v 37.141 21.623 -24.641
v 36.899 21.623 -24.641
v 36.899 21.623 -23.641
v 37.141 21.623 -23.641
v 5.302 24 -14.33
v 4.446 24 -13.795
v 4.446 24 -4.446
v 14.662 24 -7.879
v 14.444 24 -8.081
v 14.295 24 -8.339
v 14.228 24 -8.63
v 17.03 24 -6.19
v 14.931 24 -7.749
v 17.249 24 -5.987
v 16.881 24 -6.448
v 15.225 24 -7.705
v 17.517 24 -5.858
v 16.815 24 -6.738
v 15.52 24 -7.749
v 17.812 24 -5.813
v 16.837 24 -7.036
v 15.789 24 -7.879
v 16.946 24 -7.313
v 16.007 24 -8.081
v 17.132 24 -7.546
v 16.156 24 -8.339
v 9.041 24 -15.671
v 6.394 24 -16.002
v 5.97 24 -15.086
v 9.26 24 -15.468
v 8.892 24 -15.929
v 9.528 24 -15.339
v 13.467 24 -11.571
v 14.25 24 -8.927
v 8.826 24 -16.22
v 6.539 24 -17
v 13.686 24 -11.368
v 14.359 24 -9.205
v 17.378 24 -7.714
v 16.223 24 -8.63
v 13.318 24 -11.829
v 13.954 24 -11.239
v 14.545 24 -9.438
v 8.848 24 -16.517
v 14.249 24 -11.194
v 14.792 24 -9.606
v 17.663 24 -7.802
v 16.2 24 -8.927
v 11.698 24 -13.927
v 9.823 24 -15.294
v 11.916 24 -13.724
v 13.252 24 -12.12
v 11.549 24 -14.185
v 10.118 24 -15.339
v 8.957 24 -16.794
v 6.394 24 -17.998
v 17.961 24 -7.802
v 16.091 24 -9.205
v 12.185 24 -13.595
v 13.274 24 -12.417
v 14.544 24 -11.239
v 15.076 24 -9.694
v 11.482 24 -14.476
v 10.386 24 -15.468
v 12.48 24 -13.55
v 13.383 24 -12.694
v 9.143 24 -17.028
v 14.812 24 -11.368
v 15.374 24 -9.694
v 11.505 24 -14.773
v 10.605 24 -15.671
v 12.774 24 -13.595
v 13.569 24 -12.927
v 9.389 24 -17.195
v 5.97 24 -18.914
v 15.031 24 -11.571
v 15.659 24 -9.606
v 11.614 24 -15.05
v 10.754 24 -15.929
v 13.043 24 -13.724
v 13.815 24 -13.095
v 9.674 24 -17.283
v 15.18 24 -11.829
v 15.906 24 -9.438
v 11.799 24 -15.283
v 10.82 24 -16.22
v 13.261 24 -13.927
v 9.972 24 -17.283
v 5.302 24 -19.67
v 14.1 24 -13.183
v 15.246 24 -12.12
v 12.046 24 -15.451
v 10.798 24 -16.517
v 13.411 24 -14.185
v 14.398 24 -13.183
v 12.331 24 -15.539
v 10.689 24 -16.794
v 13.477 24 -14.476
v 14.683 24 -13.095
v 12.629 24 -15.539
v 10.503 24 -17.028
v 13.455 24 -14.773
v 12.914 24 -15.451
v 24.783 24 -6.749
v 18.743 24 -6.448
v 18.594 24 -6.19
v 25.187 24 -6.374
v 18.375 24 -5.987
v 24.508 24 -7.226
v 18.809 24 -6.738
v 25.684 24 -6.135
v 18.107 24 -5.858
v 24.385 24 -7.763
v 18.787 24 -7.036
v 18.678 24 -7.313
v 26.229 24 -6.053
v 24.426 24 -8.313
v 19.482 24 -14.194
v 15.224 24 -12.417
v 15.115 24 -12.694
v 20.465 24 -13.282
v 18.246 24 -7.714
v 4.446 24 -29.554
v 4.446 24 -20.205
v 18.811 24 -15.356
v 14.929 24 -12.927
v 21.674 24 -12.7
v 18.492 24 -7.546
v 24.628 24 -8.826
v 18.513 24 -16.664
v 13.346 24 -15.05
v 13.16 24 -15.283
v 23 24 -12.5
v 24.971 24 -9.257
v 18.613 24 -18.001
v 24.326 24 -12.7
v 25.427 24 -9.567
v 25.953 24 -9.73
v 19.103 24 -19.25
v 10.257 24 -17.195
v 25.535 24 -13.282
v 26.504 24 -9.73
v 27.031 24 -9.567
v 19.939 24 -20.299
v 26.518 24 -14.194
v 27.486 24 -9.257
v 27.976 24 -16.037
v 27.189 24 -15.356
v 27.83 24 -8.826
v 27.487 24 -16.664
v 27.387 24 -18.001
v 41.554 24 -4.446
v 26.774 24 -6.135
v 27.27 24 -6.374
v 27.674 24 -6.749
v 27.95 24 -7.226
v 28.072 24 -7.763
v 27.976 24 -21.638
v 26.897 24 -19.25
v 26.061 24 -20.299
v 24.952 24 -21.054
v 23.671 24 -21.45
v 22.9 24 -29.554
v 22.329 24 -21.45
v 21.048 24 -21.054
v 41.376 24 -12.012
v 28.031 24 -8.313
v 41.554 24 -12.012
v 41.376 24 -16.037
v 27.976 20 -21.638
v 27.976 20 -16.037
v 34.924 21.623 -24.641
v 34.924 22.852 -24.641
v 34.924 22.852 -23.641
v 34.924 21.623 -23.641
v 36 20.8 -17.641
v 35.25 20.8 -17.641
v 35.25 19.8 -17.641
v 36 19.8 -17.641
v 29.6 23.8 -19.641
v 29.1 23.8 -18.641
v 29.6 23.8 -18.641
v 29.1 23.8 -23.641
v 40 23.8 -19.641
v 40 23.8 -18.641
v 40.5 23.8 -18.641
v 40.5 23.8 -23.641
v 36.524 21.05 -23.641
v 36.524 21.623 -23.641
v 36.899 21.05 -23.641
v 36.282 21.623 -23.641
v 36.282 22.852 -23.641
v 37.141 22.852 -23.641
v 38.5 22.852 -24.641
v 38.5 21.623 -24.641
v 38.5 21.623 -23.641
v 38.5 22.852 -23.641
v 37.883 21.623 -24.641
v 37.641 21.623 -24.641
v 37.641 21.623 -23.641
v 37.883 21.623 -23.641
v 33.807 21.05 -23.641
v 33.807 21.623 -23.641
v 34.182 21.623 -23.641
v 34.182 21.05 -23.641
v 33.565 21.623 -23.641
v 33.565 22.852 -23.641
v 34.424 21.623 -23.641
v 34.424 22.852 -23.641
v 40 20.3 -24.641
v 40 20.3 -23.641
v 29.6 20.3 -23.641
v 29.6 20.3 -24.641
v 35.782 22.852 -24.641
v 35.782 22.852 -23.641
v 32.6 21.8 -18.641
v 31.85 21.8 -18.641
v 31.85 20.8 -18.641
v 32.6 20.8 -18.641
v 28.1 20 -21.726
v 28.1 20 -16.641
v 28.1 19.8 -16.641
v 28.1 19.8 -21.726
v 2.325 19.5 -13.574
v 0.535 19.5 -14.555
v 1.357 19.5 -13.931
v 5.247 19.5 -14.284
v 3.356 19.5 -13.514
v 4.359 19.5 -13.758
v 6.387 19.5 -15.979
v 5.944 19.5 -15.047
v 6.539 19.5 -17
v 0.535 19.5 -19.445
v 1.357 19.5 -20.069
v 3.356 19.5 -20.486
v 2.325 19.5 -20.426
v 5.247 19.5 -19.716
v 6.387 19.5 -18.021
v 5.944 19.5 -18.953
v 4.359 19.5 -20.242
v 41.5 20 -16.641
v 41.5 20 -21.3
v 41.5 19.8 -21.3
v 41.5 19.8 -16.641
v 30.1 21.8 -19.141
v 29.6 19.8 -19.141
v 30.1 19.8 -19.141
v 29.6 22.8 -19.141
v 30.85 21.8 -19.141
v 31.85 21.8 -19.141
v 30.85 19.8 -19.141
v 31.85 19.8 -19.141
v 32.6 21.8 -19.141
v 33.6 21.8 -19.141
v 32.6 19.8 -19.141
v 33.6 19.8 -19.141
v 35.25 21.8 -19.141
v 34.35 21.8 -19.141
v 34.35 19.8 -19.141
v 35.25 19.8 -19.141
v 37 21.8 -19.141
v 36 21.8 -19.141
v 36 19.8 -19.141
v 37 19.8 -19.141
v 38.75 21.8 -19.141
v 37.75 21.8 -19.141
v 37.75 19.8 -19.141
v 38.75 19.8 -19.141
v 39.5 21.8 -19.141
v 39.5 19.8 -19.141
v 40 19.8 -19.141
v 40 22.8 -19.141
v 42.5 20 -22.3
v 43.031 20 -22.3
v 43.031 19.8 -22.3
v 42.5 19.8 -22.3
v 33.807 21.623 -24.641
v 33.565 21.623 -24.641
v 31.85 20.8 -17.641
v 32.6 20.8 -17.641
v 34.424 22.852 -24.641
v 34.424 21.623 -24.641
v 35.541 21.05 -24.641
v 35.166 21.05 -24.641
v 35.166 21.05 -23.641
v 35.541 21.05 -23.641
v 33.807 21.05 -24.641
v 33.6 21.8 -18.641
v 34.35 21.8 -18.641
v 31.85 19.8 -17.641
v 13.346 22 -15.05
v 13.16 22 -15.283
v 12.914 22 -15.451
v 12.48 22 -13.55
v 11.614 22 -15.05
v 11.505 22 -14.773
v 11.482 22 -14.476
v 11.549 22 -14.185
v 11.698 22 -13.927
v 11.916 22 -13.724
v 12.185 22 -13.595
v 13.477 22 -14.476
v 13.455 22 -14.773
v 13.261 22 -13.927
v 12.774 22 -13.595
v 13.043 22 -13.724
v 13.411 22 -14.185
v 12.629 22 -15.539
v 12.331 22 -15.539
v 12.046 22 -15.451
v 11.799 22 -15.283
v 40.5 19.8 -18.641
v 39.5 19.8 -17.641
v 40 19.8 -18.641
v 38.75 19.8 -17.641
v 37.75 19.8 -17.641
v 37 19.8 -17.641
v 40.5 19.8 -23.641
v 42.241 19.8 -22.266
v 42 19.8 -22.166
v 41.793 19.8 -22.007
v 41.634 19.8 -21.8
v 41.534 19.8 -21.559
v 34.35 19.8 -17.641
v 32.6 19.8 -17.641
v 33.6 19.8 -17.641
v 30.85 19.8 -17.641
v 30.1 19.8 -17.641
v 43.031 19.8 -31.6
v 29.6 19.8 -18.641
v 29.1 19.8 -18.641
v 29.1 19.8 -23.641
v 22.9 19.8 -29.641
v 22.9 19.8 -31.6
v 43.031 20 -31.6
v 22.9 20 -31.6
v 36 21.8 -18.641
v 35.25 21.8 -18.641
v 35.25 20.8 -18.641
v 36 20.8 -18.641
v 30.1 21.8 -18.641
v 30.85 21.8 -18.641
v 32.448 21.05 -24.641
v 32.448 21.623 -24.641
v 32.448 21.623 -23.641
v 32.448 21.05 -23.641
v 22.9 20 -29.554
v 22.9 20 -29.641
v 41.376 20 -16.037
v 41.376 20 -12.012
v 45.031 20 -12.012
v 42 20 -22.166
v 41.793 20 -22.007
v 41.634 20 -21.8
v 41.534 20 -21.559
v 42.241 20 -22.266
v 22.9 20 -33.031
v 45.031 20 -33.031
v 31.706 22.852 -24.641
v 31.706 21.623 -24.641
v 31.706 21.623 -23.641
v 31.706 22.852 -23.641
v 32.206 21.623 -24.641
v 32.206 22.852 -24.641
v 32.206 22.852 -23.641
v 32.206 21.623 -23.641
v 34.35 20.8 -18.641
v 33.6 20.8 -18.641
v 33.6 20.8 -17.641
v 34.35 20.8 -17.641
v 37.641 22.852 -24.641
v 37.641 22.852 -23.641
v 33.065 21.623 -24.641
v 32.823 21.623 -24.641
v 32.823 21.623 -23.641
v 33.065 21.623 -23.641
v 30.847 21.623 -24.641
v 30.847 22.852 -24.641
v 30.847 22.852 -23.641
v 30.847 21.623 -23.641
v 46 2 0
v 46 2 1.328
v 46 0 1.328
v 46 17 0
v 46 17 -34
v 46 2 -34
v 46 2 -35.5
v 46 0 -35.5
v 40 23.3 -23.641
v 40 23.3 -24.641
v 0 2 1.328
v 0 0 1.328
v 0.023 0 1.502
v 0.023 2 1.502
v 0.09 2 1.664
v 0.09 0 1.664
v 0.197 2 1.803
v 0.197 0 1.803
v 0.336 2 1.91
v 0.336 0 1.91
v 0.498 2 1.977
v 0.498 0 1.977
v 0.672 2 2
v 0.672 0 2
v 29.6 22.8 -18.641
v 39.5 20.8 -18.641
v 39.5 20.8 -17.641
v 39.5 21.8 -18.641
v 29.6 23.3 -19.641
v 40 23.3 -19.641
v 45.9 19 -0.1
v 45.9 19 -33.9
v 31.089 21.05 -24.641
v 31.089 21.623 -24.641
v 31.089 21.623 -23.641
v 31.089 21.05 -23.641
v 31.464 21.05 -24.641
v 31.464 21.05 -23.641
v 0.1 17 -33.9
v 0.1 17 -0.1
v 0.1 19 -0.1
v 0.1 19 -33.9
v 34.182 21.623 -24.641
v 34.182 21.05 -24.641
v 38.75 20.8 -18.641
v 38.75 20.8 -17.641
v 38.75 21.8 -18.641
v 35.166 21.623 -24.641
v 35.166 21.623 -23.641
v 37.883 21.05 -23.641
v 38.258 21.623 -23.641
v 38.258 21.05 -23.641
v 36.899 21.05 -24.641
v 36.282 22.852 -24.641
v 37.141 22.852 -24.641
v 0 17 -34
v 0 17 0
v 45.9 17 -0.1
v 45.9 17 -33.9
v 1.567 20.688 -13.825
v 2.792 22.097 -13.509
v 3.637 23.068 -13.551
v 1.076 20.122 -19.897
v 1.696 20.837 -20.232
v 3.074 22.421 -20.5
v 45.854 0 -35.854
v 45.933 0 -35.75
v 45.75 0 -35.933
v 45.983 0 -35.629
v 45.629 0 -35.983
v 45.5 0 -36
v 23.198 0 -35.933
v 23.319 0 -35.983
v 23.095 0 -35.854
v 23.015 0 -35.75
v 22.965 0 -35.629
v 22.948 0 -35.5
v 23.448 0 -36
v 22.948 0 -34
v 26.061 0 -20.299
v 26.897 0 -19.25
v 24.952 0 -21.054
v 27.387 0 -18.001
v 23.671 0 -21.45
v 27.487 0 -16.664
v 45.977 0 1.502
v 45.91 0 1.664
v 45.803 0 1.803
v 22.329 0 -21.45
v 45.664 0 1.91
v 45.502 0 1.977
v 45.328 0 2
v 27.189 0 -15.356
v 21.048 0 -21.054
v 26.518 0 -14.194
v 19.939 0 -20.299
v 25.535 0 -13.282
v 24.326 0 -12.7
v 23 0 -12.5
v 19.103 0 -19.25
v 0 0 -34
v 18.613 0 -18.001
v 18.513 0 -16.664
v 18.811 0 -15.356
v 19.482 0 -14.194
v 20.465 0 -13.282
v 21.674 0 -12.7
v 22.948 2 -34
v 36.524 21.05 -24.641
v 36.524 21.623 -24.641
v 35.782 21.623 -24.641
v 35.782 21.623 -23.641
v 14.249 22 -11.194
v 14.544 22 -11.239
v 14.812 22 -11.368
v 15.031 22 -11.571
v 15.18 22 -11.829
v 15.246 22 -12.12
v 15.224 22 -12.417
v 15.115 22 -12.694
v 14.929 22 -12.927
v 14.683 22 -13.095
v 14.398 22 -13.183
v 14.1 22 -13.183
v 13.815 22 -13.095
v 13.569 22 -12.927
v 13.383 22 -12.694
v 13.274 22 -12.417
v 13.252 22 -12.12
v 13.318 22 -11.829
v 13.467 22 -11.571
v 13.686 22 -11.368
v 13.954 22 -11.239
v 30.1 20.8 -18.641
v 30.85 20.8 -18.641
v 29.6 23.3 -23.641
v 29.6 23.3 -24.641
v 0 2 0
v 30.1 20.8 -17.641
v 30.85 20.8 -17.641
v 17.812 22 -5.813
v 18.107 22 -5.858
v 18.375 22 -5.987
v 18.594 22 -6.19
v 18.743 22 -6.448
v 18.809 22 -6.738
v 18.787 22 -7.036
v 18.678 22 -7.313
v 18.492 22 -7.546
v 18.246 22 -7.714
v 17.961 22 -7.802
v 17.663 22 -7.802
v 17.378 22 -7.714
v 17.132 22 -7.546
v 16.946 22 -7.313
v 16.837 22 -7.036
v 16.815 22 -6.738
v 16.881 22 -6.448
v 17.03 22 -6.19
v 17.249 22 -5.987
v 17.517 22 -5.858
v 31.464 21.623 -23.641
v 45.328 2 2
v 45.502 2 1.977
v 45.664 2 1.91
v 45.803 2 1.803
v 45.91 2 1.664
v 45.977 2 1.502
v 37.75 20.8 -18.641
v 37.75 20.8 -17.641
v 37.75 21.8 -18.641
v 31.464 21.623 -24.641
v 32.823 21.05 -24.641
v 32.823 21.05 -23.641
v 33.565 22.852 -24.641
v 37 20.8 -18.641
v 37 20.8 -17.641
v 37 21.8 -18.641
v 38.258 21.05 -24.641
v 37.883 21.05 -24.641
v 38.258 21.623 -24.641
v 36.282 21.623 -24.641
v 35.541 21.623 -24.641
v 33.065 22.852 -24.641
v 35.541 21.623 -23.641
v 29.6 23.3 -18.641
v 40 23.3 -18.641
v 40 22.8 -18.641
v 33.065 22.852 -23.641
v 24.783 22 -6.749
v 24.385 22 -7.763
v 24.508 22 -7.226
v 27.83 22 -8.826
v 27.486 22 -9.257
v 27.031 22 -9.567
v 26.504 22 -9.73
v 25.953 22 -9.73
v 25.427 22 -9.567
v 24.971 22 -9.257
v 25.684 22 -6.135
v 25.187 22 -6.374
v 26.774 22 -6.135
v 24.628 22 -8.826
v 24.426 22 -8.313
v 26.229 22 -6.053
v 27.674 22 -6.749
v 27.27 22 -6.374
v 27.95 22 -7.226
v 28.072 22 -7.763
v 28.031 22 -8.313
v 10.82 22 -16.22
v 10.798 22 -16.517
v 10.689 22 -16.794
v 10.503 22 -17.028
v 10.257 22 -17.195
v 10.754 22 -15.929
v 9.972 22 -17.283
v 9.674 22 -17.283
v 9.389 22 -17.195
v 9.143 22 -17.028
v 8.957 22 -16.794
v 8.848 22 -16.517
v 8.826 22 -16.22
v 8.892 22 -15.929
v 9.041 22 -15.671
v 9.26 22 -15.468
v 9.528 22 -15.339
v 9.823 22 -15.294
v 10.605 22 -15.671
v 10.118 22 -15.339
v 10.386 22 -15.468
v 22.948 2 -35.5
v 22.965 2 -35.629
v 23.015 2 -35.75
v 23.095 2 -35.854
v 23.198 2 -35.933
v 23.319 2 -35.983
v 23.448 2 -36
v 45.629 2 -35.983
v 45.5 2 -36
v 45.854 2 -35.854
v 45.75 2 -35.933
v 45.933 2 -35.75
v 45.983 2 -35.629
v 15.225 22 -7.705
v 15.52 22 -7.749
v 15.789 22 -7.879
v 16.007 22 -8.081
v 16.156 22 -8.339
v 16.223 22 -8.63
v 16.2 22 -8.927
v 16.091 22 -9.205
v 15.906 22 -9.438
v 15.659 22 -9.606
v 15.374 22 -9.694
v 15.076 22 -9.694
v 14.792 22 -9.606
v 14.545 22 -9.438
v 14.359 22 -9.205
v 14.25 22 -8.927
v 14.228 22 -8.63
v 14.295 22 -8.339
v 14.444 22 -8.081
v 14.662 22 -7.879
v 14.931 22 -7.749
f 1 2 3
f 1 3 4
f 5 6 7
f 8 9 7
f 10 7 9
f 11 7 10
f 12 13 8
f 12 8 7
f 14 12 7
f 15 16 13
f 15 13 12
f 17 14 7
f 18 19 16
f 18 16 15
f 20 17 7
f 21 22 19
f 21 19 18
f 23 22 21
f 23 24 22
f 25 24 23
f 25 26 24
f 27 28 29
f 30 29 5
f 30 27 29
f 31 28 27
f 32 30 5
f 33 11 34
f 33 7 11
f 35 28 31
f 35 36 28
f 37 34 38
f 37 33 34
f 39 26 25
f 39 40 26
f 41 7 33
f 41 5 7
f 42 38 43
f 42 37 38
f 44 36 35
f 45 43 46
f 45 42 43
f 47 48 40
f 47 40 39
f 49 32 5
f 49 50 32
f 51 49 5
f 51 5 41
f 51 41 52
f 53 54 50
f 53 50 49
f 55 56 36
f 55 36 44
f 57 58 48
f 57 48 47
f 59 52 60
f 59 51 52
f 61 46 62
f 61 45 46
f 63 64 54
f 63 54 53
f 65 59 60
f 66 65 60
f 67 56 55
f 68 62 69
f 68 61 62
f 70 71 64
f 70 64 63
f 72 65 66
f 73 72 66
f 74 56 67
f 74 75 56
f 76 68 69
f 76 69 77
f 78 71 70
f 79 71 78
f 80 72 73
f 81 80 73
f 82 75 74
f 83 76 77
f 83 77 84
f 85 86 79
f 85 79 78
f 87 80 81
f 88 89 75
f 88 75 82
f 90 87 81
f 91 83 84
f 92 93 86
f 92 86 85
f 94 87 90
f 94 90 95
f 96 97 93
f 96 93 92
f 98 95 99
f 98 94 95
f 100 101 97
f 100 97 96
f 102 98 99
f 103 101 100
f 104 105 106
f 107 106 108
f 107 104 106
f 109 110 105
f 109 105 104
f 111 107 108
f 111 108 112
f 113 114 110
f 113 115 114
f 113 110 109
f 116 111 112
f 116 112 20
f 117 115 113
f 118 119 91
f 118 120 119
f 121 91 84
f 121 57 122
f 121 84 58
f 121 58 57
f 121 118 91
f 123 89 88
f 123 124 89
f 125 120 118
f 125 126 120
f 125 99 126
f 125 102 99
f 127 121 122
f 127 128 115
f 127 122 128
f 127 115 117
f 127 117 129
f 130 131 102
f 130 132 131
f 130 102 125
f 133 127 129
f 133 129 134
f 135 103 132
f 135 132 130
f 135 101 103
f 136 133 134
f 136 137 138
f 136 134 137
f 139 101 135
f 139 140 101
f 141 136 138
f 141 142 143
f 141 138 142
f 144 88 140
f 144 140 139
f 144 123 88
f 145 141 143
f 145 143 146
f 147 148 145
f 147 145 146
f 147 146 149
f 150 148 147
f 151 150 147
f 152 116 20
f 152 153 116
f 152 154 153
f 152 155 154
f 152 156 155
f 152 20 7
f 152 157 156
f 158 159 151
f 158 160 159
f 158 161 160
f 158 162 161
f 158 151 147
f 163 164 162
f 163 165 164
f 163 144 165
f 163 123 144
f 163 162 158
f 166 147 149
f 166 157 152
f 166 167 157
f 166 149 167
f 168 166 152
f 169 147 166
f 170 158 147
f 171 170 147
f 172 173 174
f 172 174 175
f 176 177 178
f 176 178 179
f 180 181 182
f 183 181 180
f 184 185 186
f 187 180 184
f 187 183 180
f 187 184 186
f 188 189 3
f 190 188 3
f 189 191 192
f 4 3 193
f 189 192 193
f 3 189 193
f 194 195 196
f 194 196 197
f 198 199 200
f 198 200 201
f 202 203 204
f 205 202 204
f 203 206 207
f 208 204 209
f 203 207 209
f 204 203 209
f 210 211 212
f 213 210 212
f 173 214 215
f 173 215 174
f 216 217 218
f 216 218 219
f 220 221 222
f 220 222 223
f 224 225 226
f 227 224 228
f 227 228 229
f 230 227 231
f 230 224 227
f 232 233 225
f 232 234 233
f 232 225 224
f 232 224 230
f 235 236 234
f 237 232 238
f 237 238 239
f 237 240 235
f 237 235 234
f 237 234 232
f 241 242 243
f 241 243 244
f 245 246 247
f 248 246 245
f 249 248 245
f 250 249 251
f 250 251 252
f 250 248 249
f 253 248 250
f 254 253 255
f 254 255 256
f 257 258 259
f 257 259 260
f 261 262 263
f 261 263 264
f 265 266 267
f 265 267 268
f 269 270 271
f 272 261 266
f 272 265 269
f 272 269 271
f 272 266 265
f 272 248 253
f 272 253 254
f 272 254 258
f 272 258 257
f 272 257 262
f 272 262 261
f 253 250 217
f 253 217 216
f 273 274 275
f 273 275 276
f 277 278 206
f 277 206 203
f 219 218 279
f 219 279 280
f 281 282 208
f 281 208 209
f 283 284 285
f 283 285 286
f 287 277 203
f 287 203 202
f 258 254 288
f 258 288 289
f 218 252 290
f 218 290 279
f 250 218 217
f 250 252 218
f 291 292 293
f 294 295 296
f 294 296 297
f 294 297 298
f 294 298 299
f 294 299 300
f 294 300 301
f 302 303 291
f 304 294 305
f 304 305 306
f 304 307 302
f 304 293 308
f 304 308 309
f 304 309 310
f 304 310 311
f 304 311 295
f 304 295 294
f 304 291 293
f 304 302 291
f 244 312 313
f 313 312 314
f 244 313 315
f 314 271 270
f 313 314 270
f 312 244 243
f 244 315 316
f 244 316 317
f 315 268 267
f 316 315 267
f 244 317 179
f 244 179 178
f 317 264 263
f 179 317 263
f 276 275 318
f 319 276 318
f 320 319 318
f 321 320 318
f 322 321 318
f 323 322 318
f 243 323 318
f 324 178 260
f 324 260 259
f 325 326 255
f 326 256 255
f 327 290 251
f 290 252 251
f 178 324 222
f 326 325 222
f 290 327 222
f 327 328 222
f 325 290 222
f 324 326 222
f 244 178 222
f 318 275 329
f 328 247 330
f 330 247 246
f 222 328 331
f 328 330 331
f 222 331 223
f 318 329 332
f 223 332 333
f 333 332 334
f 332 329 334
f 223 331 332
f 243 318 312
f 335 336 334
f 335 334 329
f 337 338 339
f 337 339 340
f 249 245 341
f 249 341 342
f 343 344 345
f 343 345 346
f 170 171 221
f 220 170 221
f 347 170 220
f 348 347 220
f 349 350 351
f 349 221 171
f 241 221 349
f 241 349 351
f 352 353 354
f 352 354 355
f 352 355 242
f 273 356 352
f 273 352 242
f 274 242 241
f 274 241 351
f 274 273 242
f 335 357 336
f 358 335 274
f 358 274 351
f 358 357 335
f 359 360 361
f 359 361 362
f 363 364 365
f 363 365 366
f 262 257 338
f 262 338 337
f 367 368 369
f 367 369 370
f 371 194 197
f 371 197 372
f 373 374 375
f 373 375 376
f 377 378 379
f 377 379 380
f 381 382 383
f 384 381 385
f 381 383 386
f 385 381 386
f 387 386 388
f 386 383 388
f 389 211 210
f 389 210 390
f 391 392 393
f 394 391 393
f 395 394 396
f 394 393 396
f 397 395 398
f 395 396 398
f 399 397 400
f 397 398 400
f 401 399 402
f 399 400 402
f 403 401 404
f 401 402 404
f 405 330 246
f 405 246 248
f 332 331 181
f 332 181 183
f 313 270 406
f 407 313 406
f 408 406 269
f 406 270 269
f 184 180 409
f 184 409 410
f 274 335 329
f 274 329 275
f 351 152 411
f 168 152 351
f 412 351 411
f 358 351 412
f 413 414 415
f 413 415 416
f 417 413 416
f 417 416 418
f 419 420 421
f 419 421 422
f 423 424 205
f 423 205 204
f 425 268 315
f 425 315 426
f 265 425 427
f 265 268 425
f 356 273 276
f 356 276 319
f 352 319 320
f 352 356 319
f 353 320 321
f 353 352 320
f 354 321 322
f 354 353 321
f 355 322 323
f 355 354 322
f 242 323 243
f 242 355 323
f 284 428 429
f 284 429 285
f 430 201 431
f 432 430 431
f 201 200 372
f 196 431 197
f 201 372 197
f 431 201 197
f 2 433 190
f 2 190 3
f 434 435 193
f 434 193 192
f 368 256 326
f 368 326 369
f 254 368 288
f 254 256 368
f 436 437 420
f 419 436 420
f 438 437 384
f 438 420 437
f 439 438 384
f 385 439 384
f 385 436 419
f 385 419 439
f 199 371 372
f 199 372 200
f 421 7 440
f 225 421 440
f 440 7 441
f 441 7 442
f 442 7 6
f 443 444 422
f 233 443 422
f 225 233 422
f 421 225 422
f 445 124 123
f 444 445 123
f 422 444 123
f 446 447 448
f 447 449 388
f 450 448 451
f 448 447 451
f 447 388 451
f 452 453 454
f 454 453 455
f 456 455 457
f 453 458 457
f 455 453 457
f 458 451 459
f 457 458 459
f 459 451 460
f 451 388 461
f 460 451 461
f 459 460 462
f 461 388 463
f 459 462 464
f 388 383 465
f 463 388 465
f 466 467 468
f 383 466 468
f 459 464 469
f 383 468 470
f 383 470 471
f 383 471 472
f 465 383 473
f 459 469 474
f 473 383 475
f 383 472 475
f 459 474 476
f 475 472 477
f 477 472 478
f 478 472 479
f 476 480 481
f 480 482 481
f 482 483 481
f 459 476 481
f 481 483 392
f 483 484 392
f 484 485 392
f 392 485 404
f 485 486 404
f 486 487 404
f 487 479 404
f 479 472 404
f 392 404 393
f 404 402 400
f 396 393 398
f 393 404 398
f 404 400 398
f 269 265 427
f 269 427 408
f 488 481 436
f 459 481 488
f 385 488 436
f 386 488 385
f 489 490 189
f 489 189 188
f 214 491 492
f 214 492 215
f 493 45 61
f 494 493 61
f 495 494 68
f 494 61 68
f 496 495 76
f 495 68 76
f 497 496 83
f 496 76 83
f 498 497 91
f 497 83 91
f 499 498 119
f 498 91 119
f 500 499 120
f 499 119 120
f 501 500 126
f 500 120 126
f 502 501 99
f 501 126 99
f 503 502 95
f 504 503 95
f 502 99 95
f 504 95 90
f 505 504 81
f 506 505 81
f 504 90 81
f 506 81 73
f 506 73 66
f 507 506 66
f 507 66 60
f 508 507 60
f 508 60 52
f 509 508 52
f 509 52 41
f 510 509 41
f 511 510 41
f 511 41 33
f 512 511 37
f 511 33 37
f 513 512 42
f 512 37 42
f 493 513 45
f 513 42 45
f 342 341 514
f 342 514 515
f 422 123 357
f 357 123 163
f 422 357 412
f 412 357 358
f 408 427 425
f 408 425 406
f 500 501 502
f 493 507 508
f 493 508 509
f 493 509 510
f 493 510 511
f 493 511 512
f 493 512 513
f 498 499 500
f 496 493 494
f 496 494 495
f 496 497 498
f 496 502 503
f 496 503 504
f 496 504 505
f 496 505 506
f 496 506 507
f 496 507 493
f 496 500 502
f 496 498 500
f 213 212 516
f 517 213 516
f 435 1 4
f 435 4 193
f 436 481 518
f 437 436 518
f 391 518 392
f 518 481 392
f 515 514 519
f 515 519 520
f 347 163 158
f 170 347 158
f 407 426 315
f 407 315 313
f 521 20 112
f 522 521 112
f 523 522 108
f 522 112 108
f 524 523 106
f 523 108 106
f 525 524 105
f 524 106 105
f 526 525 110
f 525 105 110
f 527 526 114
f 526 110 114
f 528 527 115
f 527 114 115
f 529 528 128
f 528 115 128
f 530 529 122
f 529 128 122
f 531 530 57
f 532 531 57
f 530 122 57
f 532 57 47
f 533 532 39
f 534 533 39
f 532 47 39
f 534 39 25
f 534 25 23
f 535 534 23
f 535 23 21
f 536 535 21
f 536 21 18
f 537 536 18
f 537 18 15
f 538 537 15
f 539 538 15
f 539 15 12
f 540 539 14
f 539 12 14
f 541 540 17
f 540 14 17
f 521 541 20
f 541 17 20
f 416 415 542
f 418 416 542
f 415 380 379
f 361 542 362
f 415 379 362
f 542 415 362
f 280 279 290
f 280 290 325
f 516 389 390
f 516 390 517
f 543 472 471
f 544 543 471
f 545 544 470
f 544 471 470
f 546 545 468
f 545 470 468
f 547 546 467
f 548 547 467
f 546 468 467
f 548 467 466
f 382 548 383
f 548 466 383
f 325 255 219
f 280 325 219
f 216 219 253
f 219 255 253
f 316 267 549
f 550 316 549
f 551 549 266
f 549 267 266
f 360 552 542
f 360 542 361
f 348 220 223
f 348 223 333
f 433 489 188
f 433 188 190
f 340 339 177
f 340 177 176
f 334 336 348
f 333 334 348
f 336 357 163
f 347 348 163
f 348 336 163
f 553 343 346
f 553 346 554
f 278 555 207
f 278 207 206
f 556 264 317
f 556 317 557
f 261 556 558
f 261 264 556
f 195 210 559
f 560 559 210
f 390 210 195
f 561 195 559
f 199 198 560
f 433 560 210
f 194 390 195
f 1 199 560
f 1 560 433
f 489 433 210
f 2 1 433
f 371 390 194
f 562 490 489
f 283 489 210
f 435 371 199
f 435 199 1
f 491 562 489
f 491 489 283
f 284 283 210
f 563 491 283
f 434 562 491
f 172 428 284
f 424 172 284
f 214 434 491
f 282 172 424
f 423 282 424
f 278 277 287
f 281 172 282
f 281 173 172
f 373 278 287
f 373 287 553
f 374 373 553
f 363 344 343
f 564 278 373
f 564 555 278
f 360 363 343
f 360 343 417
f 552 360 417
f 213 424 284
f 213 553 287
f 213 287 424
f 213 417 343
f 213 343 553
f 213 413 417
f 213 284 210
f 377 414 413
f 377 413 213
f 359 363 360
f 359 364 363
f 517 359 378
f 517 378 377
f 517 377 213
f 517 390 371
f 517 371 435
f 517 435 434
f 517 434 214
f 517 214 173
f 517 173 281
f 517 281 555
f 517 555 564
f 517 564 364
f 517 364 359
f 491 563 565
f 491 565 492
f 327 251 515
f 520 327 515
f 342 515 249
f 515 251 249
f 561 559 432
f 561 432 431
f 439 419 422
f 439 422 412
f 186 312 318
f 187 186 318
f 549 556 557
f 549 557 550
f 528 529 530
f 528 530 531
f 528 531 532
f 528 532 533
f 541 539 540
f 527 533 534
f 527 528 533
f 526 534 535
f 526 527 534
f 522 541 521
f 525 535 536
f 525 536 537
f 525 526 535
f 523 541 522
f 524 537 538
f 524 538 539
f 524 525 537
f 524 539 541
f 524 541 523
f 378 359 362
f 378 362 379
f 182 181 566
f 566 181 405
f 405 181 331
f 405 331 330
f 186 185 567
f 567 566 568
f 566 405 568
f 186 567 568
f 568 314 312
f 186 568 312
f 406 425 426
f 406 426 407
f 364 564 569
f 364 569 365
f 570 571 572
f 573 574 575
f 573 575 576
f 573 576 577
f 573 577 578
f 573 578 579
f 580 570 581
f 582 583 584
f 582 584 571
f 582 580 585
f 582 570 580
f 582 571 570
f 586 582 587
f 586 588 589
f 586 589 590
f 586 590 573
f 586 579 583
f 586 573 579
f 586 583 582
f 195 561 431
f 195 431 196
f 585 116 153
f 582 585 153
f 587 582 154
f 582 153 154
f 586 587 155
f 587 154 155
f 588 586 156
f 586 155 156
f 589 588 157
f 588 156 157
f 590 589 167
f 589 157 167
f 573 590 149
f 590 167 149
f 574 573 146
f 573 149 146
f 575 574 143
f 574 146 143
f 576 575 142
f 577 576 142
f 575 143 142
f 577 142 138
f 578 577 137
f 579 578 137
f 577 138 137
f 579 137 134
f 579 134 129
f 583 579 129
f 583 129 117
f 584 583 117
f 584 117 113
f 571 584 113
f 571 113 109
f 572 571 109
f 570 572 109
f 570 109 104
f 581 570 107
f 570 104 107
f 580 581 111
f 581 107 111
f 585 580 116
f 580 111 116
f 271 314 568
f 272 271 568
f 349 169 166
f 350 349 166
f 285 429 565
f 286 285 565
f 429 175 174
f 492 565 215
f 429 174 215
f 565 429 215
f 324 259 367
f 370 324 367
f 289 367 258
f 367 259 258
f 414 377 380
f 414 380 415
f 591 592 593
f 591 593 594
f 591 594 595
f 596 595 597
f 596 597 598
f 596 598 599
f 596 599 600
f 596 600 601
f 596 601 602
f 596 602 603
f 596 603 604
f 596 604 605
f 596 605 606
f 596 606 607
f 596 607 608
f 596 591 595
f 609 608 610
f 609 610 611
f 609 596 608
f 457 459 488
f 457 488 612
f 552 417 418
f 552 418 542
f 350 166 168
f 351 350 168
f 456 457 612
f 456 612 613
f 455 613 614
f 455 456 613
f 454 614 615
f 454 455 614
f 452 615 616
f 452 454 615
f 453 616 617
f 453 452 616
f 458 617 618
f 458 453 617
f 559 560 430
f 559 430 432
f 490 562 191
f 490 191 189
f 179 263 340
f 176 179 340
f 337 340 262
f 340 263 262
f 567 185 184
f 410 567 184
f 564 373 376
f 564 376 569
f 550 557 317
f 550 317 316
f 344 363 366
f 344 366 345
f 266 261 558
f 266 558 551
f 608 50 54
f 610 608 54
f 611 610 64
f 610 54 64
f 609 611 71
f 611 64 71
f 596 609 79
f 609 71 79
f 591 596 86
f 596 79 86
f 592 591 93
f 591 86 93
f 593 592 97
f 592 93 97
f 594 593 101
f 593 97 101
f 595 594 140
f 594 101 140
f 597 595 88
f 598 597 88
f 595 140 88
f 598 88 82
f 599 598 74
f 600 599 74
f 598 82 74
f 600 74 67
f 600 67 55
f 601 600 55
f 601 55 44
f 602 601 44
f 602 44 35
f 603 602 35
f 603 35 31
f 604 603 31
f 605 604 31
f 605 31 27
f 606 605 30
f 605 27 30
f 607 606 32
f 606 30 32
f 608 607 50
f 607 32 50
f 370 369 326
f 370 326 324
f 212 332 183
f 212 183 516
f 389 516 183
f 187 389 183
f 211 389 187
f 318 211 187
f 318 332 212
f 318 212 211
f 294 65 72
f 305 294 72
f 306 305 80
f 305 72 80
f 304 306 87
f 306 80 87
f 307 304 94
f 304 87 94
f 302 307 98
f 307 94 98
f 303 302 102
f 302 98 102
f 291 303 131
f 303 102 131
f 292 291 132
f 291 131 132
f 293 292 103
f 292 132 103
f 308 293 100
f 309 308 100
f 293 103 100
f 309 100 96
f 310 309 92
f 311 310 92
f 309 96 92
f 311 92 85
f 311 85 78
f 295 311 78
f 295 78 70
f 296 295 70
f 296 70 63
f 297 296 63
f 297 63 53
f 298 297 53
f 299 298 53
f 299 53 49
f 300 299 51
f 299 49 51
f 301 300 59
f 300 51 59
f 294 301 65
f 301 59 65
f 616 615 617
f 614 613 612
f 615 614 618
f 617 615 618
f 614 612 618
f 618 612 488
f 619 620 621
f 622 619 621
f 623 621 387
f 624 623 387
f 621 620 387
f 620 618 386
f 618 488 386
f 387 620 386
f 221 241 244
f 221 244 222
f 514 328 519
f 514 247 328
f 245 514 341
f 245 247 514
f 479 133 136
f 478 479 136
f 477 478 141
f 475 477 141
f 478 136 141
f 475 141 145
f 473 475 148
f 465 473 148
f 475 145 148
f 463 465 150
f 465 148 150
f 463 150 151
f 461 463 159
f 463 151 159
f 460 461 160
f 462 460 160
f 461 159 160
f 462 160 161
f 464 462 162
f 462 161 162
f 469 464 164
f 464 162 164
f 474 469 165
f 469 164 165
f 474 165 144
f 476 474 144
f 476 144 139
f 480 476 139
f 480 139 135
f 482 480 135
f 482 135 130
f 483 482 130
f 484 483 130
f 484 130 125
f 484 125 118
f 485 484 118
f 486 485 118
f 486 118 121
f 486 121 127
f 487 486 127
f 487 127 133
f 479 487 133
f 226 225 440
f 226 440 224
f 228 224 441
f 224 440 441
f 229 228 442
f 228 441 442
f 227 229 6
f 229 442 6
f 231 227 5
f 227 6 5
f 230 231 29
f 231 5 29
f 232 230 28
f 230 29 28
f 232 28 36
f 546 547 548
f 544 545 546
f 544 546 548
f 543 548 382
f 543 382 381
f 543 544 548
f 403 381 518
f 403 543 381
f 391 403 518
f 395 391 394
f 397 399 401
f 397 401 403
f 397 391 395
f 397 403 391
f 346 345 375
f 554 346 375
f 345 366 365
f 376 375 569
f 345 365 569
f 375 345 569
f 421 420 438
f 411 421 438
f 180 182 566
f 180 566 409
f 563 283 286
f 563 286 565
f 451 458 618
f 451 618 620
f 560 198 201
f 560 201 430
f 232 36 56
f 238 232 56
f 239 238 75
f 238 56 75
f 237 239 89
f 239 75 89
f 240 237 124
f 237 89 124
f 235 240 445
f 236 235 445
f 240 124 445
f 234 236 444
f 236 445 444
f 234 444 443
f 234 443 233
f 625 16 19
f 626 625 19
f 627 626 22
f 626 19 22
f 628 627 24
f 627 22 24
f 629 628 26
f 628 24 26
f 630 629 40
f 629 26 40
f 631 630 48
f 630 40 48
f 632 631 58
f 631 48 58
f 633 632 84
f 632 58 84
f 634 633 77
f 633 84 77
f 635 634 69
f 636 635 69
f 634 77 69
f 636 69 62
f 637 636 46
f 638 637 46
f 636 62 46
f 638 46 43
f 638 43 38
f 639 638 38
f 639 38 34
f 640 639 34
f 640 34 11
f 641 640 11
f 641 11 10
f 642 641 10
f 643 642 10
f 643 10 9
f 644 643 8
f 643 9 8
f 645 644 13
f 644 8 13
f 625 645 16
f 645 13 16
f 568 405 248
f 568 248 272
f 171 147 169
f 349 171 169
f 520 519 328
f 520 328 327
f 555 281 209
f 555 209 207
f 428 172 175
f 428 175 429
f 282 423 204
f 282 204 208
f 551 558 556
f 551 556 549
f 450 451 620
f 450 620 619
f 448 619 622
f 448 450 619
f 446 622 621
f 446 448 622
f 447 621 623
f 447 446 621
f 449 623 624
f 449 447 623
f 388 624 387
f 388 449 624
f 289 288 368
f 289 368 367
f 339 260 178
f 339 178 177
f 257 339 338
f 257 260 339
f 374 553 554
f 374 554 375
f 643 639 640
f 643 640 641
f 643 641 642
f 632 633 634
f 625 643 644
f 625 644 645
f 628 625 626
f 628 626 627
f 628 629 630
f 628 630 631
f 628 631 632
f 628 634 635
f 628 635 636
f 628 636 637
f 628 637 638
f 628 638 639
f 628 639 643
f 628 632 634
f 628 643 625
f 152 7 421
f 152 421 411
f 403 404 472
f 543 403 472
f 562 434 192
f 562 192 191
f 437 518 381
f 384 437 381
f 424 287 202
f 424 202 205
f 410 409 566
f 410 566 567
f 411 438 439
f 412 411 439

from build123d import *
from OCP.BRepFilletAPI import BRepFilletAPI_MakeChamfer

# Parameters (mm, degrees)
SKETCH1_W           = 46
SKETCH1_H           = 34
SKETCH1_R           = 4.5
BOSS_EXTRUDE1_DEPTH = 17
SKETCH2_W           = 45.8
SKETCH2_H           = 33.8
BOSS_EXTRUDE2_DEPTH = 2
SKETCH3_W           = 45.8
SKETCH3_H           = 33.8
BOSS_EXTRUDE3_DEPTH = 5
CHAMFER1_SIZE       = 5
CHAMFER1_SIZE2      = 4.346433689
SKETCH5_R           = 4.5
CUT_EXTRUDE1_DEPTH  = 63.032249677
CUT_EXTRUDE2_DEPTH  = 4
CUT_EXTRUDE3_DEPTH  = 4.5
CUT_EXTRUDE4_DEPTH  = 0.2
SKETCH11_W          = 11.4
SKETCH11_H          = 5
BOSS_EXTRUDE4_DEPTH = 4
SKETCH12_W          = 10.4
SKETCH12_H          = 1
CUT_EXTRUDE5_DEPTH  = 0.5
SKETCH13_W          = 10.4
SKETCH13_H          = 3
CUT_EXTRUDE6_DEPTH  = 0.5
SKETCH14_W          = 0.75
SKETCH14_H          = 2
BOSS_EXTRUDE5_DEPTH = 0.5
SKETCH15_W          = 0.75
SKETCH15_H          = 1
BOSS_EXTRUDE6_DEPTH = 1
SKETCH16_W          = 10.4
SKETCH16_H          = 3
BOSS_EXTRUDE7_DEPTH = 1
CUT_EXTRUDE7_DEPTH  = 1
SKETCH19_R          = 1
CUT_EXTRUDE8_DEPTH  = 2
SKETCH20_R          = 1.848835828
CUT_EXTRUDE9_DEPTH  = 2
BOSS_EXTRUDE8_DEPTH = 2
BOSS_EXTRUDE9_DEPTH = 2


with BuildPart() as part:
    # Sketch1 → Boss-Extrude1 (new body)
    with BuildSketch(Plane(origin=(0, 0, 0), x_dir=(1, 0, 0), z_dir=(0, 1, 0))):
        with Locations((23, 17)):
            Rectangle(SKETCH1_W, SKETCH1_H)
        with Locations(Location((23, 17, 0), (0, 0, 270))):
            Circle(SKETCH1_R, mode=Mode.SUBTRACT)
    extrude(amount=BOSS_EXTRUDE1_DEPTH)

    # Sketch2 → Boss-Extrude2 (add)
    with BuildSketch(Plane(origin=(0, 17, 0), x_dir=(1, 0, 0), z_dir=(0, 1, 0))):
        with Locations((23, 17)):
            Rectangle(SKETCH2_W, SKETCH2_H)
    extrude(amount=BOSS_EXTRUDE2_DEPTH)

    # Sketch3 → Boss-Extrude3 (add)
    with BuildSketch(Plane(origin=(0, 19, 0), x_dir=(1, 0, 0), z_dir=(0, 1, 0))):
        with Locations((23, 17)):
            Rectangle(SKETCH3_W, SKETCH3_H)
    extrude(amount=BOSS_EXTRUDE3_DEPTH)

    # Chamfer1: one chamfer whose edges measure the first distance from different faces: ONE call of the kernel's chamfer builder (chamfer() names one face for all edges)
    chamfer1_edges_1 = [part.edges().sort_by_distance(p)[0] for p in [
        (23, 24, -33.9),
    ]]
    chamfer1_side_1 = [part.faces().sort_by_distance(p)[0] for p in [
        (23, 20.5, -33.9),
    ]]
    chamfer1_edges_2 = [part.edges().sort_by_distance(p)[0] for p in [
        (0.1, 24, -17),
    ]]
    chamfer1_side_2 = [part.faces().sort_by_distance(p)[0] for p in [
        (0.1, 20.5, -17),
    ]]
    chamfer1_edges_3 = [part.edges().sort_by_distance(p)[0] for p in [
        (23, 24, -0.1),
    ]]
    chamfer1_side_3 = [part.faces().sort_by_distance(p)[0] for p in [
        (23, 20.5, -0.1),
    ]]
    chamfer1_edges_4 = [part.edges().sort_by_distance(p)[0] for p in [
        (45.9, 24, -17),
    ]]
    chamfer1_side_4 = [part.faces().sort_by_distance(p)[0] for p in [
        (45.9, 20.5, -17),
    ]]
    chamfer1 = BRepFilletAPI_MakeChamfer(part.part.solid().wrapped)
    for e in chamfer1_edges_1:
        chamfer1.Add(CHAMFER1_SIZE, CHAMFER1_SIZE2, e.wrapped, chamfer1_side_1[0].wrapped)  # the first distance lies on this face
    for e in chamfer1_edges_2:
        chamfer1.Add(CHAMFER1_SIZE, CHAMFER1_SIZE2, e.wrapped, chamfer1_side_2[0].wrapped)  # the first distance lies on this face
    for e in chamfer1_edges_3:
        chamfer1.Add(CHAMFER1_SIZE, CHAMFER1_SIZE2, e.wrapped, chamfer1_side_3[0].wrapped)  # the first distance lies on this face
    for e in chamfer1_edges_4:
        chamfer1.Add(CHAMFER1_SIZE, CHAMFER1_SIZE2, e.wrapped, chamfer1_side_4[0].wrapped)  # the first distance lies on this face
    add(Compound.cast(chamfer1.Shape()), mode=Mode.REPLACE)

    # Sketch5 → Cut-Extrude1 (cut, through all)
    with BuildSketch(Plane(origin=(0, 24, 0), x_dir=(1, 0, 0), z_dir=(0, 1, 0))):
        with Locations(Location((23, 17, 0), (0, 0, 270))):
            Circle(SKETCH5_R)
    extrude(amount=-CUT_EXTRUDE1_DEPTH, mode=Mode.SUBTRACT)

    # Sketch7 → Cut-Extrude2 (cut)
    with BuildSketch(Plane(origin=(0, 24, 0), x_dir=(1, 0, 0), z_dir=(0, 1, 0))):
        Polygon((41.375862069, 12.011652794), (41.553566311, 12.011652794), (41.553566311, 29.553566311), (22.9, 29.553566311), (27.975862069, 21.638287753), (27.975862069, 16.037336504), (41.375862069, 16.037336504), align=None)
        Polygon((45.9, 12.011652794), (45.9, 33.9), (22.9, 34), (22.9, 29.553566311), (41.553566311, 29.553566311), (41.553566311, 12.011652794), align=None)
    extrude(amount=-CUT_EXTRUDE2_DEPTH, mode=Mode.SUBTRACT)

    # Sketch9 → Cut-Extrude3 (cut)
    with BuildSketch(Plane(origin=(0, 24, 0), x_dir=(1, 0, 0), z_dir=(0, 1, 0))):
        with BuildLine():
            Line((0.1, 17), (0.1, 15.1))
            ThreePointArc((0.1, 15.1), (4.029878247, 13.643077531), (6.539387691, 17))
            Line((6.539387691, 17), (0.1, 17))
        make_face()
        with BuildLine():
            Line((0.1, 18.9), (0.1, 17))
            Line((0.1, 17), (6.539387691, 17))
            ThreePointArc((6.539387691, 17), (4.029878247, 20.356922469), (0.1, 18.9))
        make_face()
        with BuildLine():
            Line((0.1, 17), (0.1, 15.1))
            ThreePointArc((0.1, 15.1), (4.029878247, 13.643077531), (6.539387691, 17))
            Line((6.539387691, 17), (0.1, 17))
        make_face()
        with BuildLine():
            Line((0.1, 18.9), (0.1, 17))
            Line((0.1, 17), (6.539387691, 17))
            ThreePointArc((6.539387691, 17), (4.029878247, 20.356922469), (0.1, 18.9))
        make_face()
        with BuildLine():
            Line((0.1, 17), (0.1, 15.1))
            ThreePointArc((0.1, 15.1), (4.029878247, 13.643077531), (6.539387691, 17))
            Line((6.539387691, 17), (0.1, 17))
        make_face()
        with BuildLine():
            Line((0.1, 18.9), (0.1, 17))
            Line((0.1, 17), (6.539387691, 17))
            ThreePointArc((6.539387691, 17), (4.029878247, 20.356922469), (0.1, 18.9))
        make_face()
        with BuildLine():
            Line((0.1, 17), (0.1, 15.1))
            ThreePointArc((0.1, 15.1), (4.029878247, 13.643077531), (6.539387691, 17))
            Line((6.539387691, 17), (0.1, 17))
        make_face()
        with BuildLine():
            Line((0.1, 18.9), (0.1, 17))
            Line((0.1, 17), (6.539387691, 17))
            ThreePointArc((6.539387691, 17), (4.029878247, 20.356922469), (0.1, 18.9))
        make_face()
    extrude(amount=-CUT_EXTRUDE3_DEPTH, mode=Mode.SUBTRACT)

    # Sketch10 → Cut-Extrude4 (cut)
    with BuildSketch(Plane(origin=(0, 20, 0), x_dir=(1, 0, 0), z_dir=(0, 1, 0))):
        with BuildLine():
            Line((43.030713262, 22.3), (42.5, 22.3))
            ThreePointArc((42.5, 22.3), (41.792893219, 22.007106781), (41.5, 21.3))
            Line((41.5, 21.3), (41.5, 16.641494247))
            Line((41.5, 16.641494247), (28.1, 16.641494247))
            Line((28.1, 16.641494247), (28.1, 21.726215688))
            Line((28.1, 21.726215688), (22.9, 29.641494247))
            Line((22.9, 29.641494247), (22.9, 31.6))
            Line((22.9, 31.6), (43.030713262, 31.6))
            Line((43.030713262, 31.6), (43.030713262, 22.3))
        make_face()
    extrude(amount=-CUT_EXTRUDE4_DEPTH, mode=Mode.SUBTRACT)

    # Sketch11 → Boss-Extrude4 (add)
    with BuildSketch(Plane(origin=(0, 19.8, 0), x_dir=(1, 0, 0), z_dir=(0, 1, 0))):
        with Locations((34.8, 21.141494247)):
            Rectangle(SKETCH11_W, SKETCH11_H)
    extrude(amount=BOSS_EXTRUDE4_DEPTH)

    # Sketch12 → Cut-Extrude5 (cut)
    with BuildSketch(Plane(origin=(0, 23.8, 0), x_dir=(1, 0, 0), z_dir=(0, 1, 0))):
        with Locations((34.8, 19.141494247)):
            Rectangle(SKETCH12_W, SKETCH12_H)
    extrude(amount=-CUT_EXTRUDE5_DEPTH, mode=Mode.SUBTRACT)

    # Sketch13 → Cut-Extrude6 (cut)
    with BuildSketch(Plane.XY.offset(-18.641494247)):
        with Locations((34.8, 21.3)):
            Rectangle(SKETCH13_W, SKETCH13_H)
    extrude(amount=-CUT_EXTRUDE6_DEPTH, mode=Mode.SUBTRACT)

    # Sketch14 → Boss-Extrude5 (add)
    with BuildSketch(Plane.XY.offset(-19.141494247)):
        with Locations((30.475, 20.8)):
            Rectangle(SKETCH14_W, SKETCH14_H)
        with Locations((32.225, 20.8)):
            Rectangle(SKETCH14_W, SKETCH14_H)
        with Locations((33.975, 20.8)):
            Rectangle(SKETCH14_W, SKETCH14_H)
        with Locations((35.625, 20.8)):
            Rectangle(SKETCH14_W, SKETCH14_H)
        with Locations((37.375, 20.8)):
            Rectangle(SKETCH14_W, SKETCH14_H)
        with Locations((39.125, 20.8)):
            Rectangle(SKETCH14_W, SKETCH14_H)
    extrude(amount=BOSS_EXTRUDE5_DEPTH)

    # Sketch15 → Boss-Extrude6 (add)
    with BuildSketch(Plane.XY.offset(-18.641494247)):
        with Locations((30.475, 20.3)):
            Rectangle(SKETCH15_W, SKETCH15_H)
        with Locations((32.225, 20.3)):
            Rectangle(SKETCH15_W, SKETCH15_H)
        with Locations((33.975, 20.3)):
            Rectangle(SKETCH15_W, SKETCH15_H)
        with Locations((35.625, 20.3)):
            Rectangle(SKETCH15_W, SKETCH15_H)
        with Locations((37.375, 20.3)):
            Rectangle(SKETCH15_W, SKETCH15_H)
        with Locations((39.125, 20.3)):
            Rectangle(SKETCH15_W, SKETCH15_H)
    extrude(amount=BOSS_EXTRUDE6_DEPTH)

    # Sketch16 → Boss-Extrude7 (add)
    with BuildSketch(Plane(origin=(0, 0, -23.641494247), x_dir=(-1, 0, 0), z_dir=(0, 0, -1))):
        with Locations((-34.8, 21.8)):
            Rectangle(SKETCH16_W, SKETCH16_H)
    extrude(amount=BOSS_EXTRUDE7_DEPTH)

    # Sketch18 → Cut-Extrude7 (cut)
    with BuildSketch(Plane(origin=(0, 0, -24.641494247), x_dir=(-1, 0, 0), z_dir=(0, 0, -1))):
        Polygon((-38.5, 22.851547848), (-37.641246713, 22.851547848), (-37.641246713, 21.62271547), (-37.883028636, 21.62271547), (-37.883028636, 21.05), (-38.258218077, 21.05), (-38.258218077, 21.62271547), (-38.5, 21.62271547), align=None)
        Polygon((-35.782493426, 22.851547848), (-34.923740138, 22.851547848), (-34.923740138, 21.62271547), (-35.165522062, 21.62271547), (-35.165522062, 21.05), (-35.540711502, 21.05), (-35.540711502, 21.62271547), (-35.782493426, 21.62271547), align=None)
        Polygon((-37.141246713, 22.851547848), (-36.282493426, 22.851547848), (-36.282493426, 21.62271547), (-36.524275349, 21.62271547), (-36.524275349, 21.05), (-36.89946479, 21.05), (-36.89946479, 21.62271547), (-37.141246713, 21.62271547), align=None)
        Polygon((-34.423740138, 22.851547848), (-33.564986851, 22.851547848), (-33.564986851, 21.62271547), (-33.806768774, 21.62271547), (-33.806768774, 21.05), (-34.181958215, 21.05), (-34.181958215, 21.62271547), (-34.423740138, 21.62271547), align=None)
        Polygon((-33.064986851, 22.851547848), (-32.206233564, 22.851547848), (-32.206233564, 21.62271547), (-32.448015487, 21.62271547), (-32.448015487, 21.05), (-32.823204928, 21.05), (-32.823204928, 21.62271547), (-33.064986851, 21.62271547), align=None)
        Polygon((-31.706233564, 22.851547848), (-30.847480277, 22.851547848), (-30.847480277, 21.62271547), (-31.0892622, 21.62271547), (-31.0892622, 21.05), (-31.464451641, 21.05), (-31.464451641, 21.62271547), (-31.706233564, 21.62271547), align=None)
    extrude(amount=-CUT_EXTRUDE7_DEPTH, mode=Mode.SUBTRACT)

    # Sketch19 → Cut-Extrude8 (cut)
    with BuildSketch(Plane(origin=(0, 24, 0), x_dir=(1, 0, 0), z_dir=(0, 1, 0))):
        with Locations(Location((9.822889118, 16.294475275, 0), (0, 0, 270))):
            Circle(SKETCH19_R)
        with Locations(Location((12.479656801, 14.55031441, 0), (0, 0, 270))):
            Circle(SKETCH19_R)
        with Locations(Location((14.248903695, 12.19430902, 0), (0, 0, 270))):
            Circle(SKETCH19_R)
        with Locations(Location((15.225409883, 8.704826885, 0), (0, 0, 270))):
            Circle(SKETCH19_R)
        with Locations(Location((17.811892688, 6.813228664, 0), (0, 0, 270))):
            Circle(SKETCH19_R)
    extrude(amount=-CUT_EXTRUDE8_DEPTH, mode=Mode.SUBTRACT)

    # Sketch20 → Cut-Extrude9 (cut)
    with BuildSketch(Plane(origin=(0, 24, 0), x_dir=(1, 0, 0), z_dir=(0, 1, 0))):
        with Locations(Location((26.228756872, 7.901616706, 0), (0, 0, 270))):
            Circle(SKETCH20_R)
    extrude(amount=-CUT_EXTRUDE9_DEPTH, mode=Mode.SUBTRACT)

    # Sketch21 → Boss-Extrude8 (add)
    with BuildSketch(Plane.XZ):
        with BuildLine():
            Line((46, -34), (22.948134598, -34))
            Line((22.948134598, -34), (22.948134598, -35.5))
            ThreePointArc((22.948134598, -35.5), (23.094581208, -35.853553391), (23.448134598, -36))
            Line((23.448134598, -36), (45.5, -36))
            ThreePointArc((45.5, -36), (45.853553391, -35.853553391), (46, -35.5))
            Line((46, -35.5), (46, -34))
        make_face()
    extrude(amount=-BOSS_EXTRUDE8_DEPTH)

    # Sketch22 → Boss-Extrude9 (add)
    with BuildSketch(Plane.XZ):
        with BuildLine():
            Line((46, 0), (0, 0))
            Line((0, 0), (0, 1.328354237))
            ThreePointArc((0, 1.328354237), (0.196720489, 1.803279511), (0.671645763, 2))
            Line((0.671645763, 2), (45.328354237, 2))
            ThreePointArc((45.328354237, 2), (45.803279511, 1.803279511), (46, 1.328354237))
            Line((46, 1.328354237), (46, 0))
        make_face()
    extrude(amount=-BOSS_EXTRUDE9_DEPTH)


solid = part.part
